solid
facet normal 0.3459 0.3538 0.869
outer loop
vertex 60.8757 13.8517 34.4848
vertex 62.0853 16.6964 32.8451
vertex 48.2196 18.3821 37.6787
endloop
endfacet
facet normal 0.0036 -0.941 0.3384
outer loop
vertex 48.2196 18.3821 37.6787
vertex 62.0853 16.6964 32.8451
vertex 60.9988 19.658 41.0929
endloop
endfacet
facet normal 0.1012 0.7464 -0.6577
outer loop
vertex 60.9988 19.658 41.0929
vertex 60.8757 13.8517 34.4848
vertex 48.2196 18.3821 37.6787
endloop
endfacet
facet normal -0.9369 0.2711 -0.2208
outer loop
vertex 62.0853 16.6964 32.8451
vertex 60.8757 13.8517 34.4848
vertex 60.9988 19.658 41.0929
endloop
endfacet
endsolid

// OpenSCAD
// Auto-generated auxetic polyhedron
points = [
    [48.219569, 18.382132, 37.678691],
    [62.085316, 16.696370, 32.845149],
    [60.875660, 13.851694, 34.484824],
    [60.998751, 19.657957, 41.092874],
];

faces = [
    [0, 1, 2],
    [3, 1, 0],
    [0, 2, 3],
    [3, 2, 1],
];

polyhedron(points = points, faces = faces);
